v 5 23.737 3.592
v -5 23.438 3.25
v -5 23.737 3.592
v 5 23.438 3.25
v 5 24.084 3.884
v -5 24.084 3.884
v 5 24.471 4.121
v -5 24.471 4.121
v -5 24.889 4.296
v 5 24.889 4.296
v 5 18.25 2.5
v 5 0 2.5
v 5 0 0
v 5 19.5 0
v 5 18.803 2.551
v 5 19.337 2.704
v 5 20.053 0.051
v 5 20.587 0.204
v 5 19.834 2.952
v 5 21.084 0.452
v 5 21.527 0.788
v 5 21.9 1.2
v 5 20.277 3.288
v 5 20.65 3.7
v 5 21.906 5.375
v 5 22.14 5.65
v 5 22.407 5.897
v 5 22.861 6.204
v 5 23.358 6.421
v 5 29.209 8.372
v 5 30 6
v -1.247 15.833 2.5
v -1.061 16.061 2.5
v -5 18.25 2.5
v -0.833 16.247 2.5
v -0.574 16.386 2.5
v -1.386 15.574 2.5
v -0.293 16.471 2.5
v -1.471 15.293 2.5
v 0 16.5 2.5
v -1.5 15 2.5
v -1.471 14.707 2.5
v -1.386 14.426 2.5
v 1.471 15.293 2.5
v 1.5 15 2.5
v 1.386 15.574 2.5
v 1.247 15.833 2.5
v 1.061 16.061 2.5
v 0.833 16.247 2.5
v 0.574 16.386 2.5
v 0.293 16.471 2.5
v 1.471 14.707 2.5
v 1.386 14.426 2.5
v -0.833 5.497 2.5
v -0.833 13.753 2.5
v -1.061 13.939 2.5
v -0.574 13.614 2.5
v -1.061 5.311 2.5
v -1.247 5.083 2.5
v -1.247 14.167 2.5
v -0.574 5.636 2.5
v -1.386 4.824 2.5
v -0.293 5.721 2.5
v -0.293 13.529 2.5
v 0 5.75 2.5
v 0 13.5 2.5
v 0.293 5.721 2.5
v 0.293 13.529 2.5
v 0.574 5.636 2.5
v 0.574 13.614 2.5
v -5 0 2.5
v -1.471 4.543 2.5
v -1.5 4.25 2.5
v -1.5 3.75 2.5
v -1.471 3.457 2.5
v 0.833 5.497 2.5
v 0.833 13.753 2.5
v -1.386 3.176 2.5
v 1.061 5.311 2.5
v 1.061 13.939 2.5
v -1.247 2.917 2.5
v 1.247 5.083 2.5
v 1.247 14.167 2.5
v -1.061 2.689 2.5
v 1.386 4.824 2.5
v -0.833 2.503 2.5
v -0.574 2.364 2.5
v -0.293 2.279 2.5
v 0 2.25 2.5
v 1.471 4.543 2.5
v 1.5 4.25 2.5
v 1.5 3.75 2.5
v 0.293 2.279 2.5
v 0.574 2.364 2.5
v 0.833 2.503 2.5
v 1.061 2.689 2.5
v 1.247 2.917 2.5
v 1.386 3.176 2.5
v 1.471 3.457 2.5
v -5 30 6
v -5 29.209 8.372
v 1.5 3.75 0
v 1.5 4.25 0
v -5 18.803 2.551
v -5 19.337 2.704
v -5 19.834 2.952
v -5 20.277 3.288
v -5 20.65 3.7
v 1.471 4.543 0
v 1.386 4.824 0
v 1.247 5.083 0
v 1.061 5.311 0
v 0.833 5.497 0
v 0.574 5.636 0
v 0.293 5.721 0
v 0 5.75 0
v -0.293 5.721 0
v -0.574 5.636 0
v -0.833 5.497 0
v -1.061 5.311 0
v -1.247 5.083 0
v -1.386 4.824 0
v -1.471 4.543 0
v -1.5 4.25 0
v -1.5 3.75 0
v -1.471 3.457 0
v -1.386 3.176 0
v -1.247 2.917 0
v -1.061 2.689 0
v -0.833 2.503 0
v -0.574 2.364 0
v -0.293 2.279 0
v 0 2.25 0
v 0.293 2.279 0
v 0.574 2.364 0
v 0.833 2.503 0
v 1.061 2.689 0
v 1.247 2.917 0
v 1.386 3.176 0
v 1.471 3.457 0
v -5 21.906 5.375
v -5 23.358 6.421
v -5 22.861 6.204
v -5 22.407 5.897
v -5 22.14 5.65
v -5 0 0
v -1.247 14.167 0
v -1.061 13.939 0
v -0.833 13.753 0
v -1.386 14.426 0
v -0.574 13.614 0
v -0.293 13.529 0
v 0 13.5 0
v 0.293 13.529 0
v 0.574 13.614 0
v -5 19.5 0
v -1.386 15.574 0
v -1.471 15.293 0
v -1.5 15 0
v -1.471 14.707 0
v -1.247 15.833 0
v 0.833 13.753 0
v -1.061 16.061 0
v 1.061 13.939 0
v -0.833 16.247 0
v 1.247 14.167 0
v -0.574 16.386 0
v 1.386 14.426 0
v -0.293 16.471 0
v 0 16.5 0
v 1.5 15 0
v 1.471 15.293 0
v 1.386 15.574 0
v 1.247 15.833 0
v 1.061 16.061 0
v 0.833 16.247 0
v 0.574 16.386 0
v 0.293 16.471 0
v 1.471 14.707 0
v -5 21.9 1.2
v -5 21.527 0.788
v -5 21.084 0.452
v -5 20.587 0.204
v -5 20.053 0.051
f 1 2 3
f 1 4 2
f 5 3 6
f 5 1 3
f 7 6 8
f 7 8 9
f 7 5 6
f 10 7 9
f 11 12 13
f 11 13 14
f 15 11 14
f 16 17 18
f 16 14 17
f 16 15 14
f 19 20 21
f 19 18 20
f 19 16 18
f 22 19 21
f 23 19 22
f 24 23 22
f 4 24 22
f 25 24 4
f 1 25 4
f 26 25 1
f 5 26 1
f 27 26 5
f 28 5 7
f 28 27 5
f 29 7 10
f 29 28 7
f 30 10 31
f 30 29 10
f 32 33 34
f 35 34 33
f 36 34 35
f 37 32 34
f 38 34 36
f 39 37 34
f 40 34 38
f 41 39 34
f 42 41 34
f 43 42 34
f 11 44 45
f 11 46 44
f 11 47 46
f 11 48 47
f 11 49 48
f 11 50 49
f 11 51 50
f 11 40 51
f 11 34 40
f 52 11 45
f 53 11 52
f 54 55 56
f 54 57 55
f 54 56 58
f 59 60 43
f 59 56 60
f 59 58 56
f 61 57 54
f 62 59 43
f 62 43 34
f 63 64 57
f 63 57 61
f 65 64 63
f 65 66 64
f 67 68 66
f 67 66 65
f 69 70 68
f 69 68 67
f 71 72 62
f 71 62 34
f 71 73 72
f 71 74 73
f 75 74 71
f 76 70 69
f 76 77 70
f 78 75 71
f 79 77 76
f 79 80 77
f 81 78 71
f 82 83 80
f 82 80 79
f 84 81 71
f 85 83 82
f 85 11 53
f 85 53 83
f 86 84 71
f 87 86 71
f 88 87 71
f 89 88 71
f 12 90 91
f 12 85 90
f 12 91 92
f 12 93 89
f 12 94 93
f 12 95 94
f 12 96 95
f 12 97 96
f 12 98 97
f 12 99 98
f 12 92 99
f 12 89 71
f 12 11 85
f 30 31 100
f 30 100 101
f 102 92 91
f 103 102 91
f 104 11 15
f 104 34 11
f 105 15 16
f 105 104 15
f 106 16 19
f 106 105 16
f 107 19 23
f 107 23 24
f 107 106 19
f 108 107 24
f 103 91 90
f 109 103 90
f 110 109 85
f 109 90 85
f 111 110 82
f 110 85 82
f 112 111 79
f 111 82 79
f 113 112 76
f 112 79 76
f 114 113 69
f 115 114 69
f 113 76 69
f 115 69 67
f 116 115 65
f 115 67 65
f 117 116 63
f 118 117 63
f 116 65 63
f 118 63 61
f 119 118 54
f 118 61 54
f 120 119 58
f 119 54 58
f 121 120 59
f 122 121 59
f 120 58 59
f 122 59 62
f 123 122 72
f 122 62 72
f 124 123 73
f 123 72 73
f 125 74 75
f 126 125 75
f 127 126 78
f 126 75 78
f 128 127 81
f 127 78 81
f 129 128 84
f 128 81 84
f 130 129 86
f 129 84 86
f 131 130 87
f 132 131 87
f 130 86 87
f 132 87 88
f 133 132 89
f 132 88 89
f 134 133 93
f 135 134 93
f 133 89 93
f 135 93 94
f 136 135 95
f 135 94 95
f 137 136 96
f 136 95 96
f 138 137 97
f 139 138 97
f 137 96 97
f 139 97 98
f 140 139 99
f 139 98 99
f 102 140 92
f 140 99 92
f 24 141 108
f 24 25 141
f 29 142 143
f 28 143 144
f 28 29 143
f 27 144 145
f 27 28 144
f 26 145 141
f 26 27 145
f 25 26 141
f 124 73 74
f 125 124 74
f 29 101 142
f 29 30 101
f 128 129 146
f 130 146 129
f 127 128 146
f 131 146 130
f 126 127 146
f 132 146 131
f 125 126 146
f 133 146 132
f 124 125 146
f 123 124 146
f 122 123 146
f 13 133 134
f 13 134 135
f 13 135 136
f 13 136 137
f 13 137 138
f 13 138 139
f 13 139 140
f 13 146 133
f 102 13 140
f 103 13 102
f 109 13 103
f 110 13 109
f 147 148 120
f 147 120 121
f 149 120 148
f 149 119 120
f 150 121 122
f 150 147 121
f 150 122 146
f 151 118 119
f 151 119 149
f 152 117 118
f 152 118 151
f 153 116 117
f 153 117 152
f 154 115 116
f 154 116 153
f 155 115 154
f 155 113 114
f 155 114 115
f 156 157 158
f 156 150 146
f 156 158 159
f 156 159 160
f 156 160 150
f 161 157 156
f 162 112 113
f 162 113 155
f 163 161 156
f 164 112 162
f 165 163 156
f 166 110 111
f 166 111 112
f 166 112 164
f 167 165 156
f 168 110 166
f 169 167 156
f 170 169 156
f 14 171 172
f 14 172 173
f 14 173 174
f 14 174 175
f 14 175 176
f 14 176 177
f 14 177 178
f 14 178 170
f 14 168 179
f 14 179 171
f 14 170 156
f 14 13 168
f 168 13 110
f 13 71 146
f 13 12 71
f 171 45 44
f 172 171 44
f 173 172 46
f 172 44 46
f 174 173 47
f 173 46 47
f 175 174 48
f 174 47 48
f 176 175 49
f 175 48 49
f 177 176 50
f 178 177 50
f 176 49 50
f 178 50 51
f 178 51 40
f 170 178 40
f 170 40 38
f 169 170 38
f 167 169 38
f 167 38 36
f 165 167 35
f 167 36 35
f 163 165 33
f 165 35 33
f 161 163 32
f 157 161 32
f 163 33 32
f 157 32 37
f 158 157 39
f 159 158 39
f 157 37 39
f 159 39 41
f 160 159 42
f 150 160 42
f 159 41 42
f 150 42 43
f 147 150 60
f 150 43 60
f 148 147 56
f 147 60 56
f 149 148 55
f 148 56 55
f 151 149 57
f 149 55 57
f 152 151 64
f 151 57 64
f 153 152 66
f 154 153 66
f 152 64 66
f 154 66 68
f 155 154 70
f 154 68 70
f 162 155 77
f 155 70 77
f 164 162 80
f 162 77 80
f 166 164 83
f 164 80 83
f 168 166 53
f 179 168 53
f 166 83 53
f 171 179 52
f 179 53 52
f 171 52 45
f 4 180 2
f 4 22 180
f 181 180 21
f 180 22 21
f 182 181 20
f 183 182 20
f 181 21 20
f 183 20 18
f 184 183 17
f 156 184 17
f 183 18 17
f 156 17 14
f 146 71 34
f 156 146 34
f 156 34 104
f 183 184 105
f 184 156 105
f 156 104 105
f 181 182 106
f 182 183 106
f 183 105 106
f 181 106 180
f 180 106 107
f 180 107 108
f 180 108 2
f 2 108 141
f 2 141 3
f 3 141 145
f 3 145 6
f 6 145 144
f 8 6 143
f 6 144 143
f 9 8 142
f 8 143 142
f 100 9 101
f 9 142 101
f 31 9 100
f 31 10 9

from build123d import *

# Parameters (mm, degrees)
F1_DEPTH      = 5
F1_DEPTH_BACK = 5
F2_R          = 3
F3_R          = 3
F4_R          = 1.5
F5_DEPTH      = 2.5


with BuildPart() as f1:
    # F0 (on Right) → F1 (new body, two sides)
    with BuildSketch(Plane.YZ) as f1_sk:
        Polygon((0, 2.5), (0, 0), (21, 0), (24, 4), (22, 5.5), (19.75, 2.5), align=None)
        Polygon((22, 5.5), (24, 4), (30, 6), (29.209430585, 8.3717082451), (22.4685647168, 6.1247529557), align=None)
    extrude(amount=F1_DEPTH)
    extrude(f1_sk.sketch, amount=-F1_DEPTH_BACK)

    # F2
    f2_edges = [f1.edges().sort_by_distance(p)[0] for p in [
        (0, 21, 0),
        (0, 19.75, 2.5),
    ]]
    fillet(f2_edges, radius=F2_R)

    # F3
    f3_edges = [f1.edges().sort_by_distance(p)[0] for p in [
        (0, 22.468565, 6.124753),
        (0, 24, 4),
    ]]
    fillet(f3_edges, radius=F3_R)

    # F4 (on face) → F5 (cut, through all)
    with BuildSketch(Plane.XY.offset(2.5)):
        with Locations((0, 15)):
            Circle(F4_R)
        with BuildLine():
            ThreePointArc((1.4947825929, 3.875), (1.4986950806, 3.937445581), (1.5, 4))
            ThreePointArc((1.5, 4), (1.4986950806, 4.062554419), (1.4947825929, 4.125))
            ThreePointArc((1.4947825929, 4.125), (1.4882142436, 4.0623344324), (1.4790199458, 4))
            ThreePointArc((1.4790199458, 4), (1.4882142436, 3.9376655676), (1.4947825929, 3.875))
        make_face()
        with BuildLine():
            ThreePointArc((-1.4790199458, 4), (-1.4882142436, 4.0623344324), (-1.4947825929, 4.125))
            ThreePointArc((-1.4947825929, 4.125), (-1.4986950806, 4.062554419), (-1.5, 4))
            ThreePointArc((-1.5, 4), (-1.4986950806, 3.937445581), (-1.4947825929, 3.875))
            ThreePointArc((-1.4947825929, 3.875), (-1.4882142436, 3.9376655676), (-1.4790199458, 4))
        make_face()
        with BuildLine():
            ThreePointArc((-1.4790199458, 4), (0, 2.75), (1.4790199458, 4))
            ThreePointArc((1.4790199458, 4), (0, 5.25), (-1.4790199458, 4))
        make_face()
        with BuildLine():
            ThreePointArc((1.4790199458, 4), (1.4882142436, 4.0623344324), (1.4947825929, 4.125))
            ThreePointArc((1.4947825929, 4.125), (0, 5.5), (-1.4947825929, 4.125))
            ThreePointArc((-1.4947825929, 4.125), (-1.4882142436, 4.0623344324), (-1.4790199458, 4))
            ThreePointArc((-1.4790199458, 4), (0, 5.25), (1.4790199458, 4))
        make_face()
        with BuildLine():
            ThreePointArc((-1.4947825929, 4.125), (0, 5.5), (1.4947825929, 4.125))
            ThreePointArc((1.4947825929, 4.125), (1.4986950806, 4.187445581), (1.5, 4.25))
            ThreePointArc((1.5, 4.25), (0, 5.75), (-1.5, 4.25))
            ThreePointArc((-1.5, 4.25), (-1.4986950806, 4.187445581), (-1.4947825929, 4.125))
        make_face()
        with BuildLine():
            ThreePointArc((-1.4947825929, 3.875), (0, 2.5), (1.4947825929, 3.875))
            ThreePointArc((1.4947825929, 3.875), (1.4882142436, 3.9376655676), (1.4790199458, 4))
            ThreePointArc((1.4790199458, 4), (0, 2.75), (-1.4790199458, 4))
            ThreePointArc((-1.4790199458, 4), (-1.4882142436, 3.9376655676), (-1.4947825929, 3.875))
        make_face()
        with BuildLine():
            ThreePointArc((1.5, 3.75), (1.4986950806, 3.812554419), (1.4947825929, 3.875))
            ThreePointArc((1.4947825929, 3.875), (0, 2.5), (-1.4947825929, 3.875))
            ThreePointArc((-1.4947825929, 3.875), (-1.4986950806, 3.812554419), (-1.5, 3.75))
            ThreePointArc((-1.5, 3.75), (0, 2.25), (1.5, 3.75))
        make_face()
        with BuildLine():
            ThreePointArc((1.4947825929, 4.125), (1.4986950806, 4.062554419), (1.5, 4))
            Line((1.5, 4), (1.5, 4.25))
            ThreePointArc((1.5, 4.25), (1.4986950806, 4.187445581), (1.4947825929, 4.125))
        make_face()
        with BuildLine():
            Line((1.5, 3.75), (1.5, 4))
            ThreePointArc((1.5, 4), (1.4986950806, 3.937445581), (1.4947825929, 3.875))
            ThreePointArc((1.4947825929, 3.875), (1.4986950806, 3.812554419), (1.5, 3.75))
        make_face()
        with BuildLine():
            ThreePointArc((-1.5, 4), (-1.4986950806, 4.062554419), (-1.4947825929, 4.125))
            ThreePointArc((-1.4947825929, 4.125), (-1.4986950806, 4.187445581), (-1.5, 4.25))
            Line((-1.5, 4.25), (-1.5, 4))
        make_face()
        with BuildLine():
            ThreePointArc((-1.5, 3.75), (-1.4986950806, 3.812554419), (-1.4947825929, 3.875))
            ThreePointArc((-1.4947825929, 3.875), (-1.4986950806, 3.937445581), (-1.5, 4))
            Line((-1.5, 4), (-1.5, 3.75))
        make_face()
    extrude(amount=-F5_DEPTH, mode=Mode.SUBTRACT)


solid = f1.part
